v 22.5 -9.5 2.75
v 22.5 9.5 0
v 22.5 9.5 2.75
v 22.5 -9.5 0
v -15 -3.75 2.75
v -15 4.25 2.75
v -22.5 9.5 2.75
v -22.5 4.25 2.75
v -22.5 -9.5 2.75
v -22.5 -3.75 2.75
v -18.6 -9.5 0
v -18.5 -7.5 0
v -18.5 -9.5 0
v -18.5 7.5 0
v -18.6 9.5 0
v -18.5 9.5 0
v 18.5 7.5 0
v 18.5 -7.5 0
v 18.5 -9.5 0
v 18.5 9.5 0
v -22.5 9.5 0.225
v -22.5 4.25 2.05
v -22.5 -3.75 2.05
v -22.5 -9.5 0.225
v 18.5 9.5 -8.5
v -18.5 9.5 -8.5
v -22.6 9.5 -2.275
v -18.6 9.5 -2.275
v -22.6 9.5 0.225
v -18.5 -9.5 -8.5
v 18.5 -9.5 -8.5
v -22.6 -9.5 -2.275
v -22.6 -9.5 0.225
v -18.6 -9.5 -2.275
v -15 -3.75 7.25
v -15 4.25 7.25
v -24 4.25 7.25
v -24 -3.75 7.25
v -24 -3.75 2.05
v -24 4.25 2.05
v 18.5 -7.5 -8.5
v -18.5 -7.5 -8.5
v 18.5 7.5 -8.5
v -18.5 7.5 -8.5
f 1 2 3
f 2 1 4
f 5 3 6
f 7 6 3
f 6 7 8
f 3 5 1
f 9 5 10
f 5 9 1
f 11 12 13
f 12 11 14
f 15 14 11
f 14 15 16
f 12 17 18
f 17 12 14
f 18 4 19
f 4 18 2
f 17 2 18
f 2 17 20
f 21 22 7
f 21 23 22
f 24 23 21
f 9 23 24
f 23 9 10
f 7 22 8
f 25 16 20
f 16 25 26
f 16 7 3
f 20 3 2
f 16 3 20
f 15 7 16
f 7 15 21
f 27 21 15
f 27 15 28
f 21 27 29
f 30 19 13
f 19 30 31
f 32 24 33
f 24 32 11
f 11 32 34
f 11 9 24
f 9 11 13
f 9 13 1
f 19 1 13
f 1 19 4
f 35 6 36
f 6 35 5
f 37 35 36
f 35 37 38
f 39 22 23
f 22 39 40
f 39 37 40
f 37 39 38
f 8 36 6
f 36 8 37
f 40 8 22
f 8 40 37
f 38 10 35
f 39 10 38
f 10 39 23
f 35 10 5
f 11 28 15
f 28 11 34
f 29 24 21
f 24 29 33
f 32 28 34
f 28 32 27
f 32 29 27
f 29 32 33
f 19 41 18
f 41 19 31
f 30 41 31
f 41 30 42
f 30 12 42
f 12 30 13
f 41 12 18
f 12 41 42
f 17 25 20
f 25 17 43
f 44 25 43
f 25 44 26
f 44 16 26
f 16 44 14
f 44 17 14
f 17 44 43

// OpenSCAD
//    This file is part of PMR-Model.
//
//    PMR-Model is free software: you can redistribute it and/or modify
//    it under the terms of the GNU General Public License as published by
//    the Free Software Foundation, either version 3 of the License, or
//    (at your option) any later version.
//
//    PMR-Model is distributed in the hope that it will be useful,
//    but WITHOUT ANY WARRANTY; without even the implied warranty of
//    MERCHANTABILITY or FITNESS FOR A PARTICULAR PURPOSE.  See the
//    GNU General Public License for more details.
//
//    You should have received a copy of the GNU General Public License
//    along with PMR-Model.  If not, see <http://www.gnu.org/licenses/>.

// Model of standard arduino nano v3 boards

boardLength = 45;
boardWidth = 19;
boardHeight = 2.75;

pins = 8.5;

arduinoNano();
//arduinoNano_withoutPins();


module arduinoNano_withoutPins(){
	translate([-boardLength/2,-boardWidth/2,0]){
		union(){
			cube([boardLength, boardWidth, boardHeight]);				
			translate([-1.5,boardWidth/2-3.75,boardHeight-0.1-0.6]){
				cube([9, 8, 5.2]);
			}
			translate([2-0.1,boardWidth/2,-boardHeight/2+0.1+0.25]){
				cube([4, boardWidth, 3-0.5], center=true);
			}
		}
	}
}

module arduinoNano(){
	union(){
		arduinoNano_withoutPins();
		translate([-boardLength/2,-boardWidth/2,0]){
			union(){
				cube([boardLength, boardWidth, boardHeight]);
				translate([2+2,0,-pins]){
					cube([boardLength-8, 2, pins]);
				}
				translate([2+2,boardWidth-2,-pins]){
					cube([boardLength-8, 2, pins]);
				}			
			}
		}
	}
}
